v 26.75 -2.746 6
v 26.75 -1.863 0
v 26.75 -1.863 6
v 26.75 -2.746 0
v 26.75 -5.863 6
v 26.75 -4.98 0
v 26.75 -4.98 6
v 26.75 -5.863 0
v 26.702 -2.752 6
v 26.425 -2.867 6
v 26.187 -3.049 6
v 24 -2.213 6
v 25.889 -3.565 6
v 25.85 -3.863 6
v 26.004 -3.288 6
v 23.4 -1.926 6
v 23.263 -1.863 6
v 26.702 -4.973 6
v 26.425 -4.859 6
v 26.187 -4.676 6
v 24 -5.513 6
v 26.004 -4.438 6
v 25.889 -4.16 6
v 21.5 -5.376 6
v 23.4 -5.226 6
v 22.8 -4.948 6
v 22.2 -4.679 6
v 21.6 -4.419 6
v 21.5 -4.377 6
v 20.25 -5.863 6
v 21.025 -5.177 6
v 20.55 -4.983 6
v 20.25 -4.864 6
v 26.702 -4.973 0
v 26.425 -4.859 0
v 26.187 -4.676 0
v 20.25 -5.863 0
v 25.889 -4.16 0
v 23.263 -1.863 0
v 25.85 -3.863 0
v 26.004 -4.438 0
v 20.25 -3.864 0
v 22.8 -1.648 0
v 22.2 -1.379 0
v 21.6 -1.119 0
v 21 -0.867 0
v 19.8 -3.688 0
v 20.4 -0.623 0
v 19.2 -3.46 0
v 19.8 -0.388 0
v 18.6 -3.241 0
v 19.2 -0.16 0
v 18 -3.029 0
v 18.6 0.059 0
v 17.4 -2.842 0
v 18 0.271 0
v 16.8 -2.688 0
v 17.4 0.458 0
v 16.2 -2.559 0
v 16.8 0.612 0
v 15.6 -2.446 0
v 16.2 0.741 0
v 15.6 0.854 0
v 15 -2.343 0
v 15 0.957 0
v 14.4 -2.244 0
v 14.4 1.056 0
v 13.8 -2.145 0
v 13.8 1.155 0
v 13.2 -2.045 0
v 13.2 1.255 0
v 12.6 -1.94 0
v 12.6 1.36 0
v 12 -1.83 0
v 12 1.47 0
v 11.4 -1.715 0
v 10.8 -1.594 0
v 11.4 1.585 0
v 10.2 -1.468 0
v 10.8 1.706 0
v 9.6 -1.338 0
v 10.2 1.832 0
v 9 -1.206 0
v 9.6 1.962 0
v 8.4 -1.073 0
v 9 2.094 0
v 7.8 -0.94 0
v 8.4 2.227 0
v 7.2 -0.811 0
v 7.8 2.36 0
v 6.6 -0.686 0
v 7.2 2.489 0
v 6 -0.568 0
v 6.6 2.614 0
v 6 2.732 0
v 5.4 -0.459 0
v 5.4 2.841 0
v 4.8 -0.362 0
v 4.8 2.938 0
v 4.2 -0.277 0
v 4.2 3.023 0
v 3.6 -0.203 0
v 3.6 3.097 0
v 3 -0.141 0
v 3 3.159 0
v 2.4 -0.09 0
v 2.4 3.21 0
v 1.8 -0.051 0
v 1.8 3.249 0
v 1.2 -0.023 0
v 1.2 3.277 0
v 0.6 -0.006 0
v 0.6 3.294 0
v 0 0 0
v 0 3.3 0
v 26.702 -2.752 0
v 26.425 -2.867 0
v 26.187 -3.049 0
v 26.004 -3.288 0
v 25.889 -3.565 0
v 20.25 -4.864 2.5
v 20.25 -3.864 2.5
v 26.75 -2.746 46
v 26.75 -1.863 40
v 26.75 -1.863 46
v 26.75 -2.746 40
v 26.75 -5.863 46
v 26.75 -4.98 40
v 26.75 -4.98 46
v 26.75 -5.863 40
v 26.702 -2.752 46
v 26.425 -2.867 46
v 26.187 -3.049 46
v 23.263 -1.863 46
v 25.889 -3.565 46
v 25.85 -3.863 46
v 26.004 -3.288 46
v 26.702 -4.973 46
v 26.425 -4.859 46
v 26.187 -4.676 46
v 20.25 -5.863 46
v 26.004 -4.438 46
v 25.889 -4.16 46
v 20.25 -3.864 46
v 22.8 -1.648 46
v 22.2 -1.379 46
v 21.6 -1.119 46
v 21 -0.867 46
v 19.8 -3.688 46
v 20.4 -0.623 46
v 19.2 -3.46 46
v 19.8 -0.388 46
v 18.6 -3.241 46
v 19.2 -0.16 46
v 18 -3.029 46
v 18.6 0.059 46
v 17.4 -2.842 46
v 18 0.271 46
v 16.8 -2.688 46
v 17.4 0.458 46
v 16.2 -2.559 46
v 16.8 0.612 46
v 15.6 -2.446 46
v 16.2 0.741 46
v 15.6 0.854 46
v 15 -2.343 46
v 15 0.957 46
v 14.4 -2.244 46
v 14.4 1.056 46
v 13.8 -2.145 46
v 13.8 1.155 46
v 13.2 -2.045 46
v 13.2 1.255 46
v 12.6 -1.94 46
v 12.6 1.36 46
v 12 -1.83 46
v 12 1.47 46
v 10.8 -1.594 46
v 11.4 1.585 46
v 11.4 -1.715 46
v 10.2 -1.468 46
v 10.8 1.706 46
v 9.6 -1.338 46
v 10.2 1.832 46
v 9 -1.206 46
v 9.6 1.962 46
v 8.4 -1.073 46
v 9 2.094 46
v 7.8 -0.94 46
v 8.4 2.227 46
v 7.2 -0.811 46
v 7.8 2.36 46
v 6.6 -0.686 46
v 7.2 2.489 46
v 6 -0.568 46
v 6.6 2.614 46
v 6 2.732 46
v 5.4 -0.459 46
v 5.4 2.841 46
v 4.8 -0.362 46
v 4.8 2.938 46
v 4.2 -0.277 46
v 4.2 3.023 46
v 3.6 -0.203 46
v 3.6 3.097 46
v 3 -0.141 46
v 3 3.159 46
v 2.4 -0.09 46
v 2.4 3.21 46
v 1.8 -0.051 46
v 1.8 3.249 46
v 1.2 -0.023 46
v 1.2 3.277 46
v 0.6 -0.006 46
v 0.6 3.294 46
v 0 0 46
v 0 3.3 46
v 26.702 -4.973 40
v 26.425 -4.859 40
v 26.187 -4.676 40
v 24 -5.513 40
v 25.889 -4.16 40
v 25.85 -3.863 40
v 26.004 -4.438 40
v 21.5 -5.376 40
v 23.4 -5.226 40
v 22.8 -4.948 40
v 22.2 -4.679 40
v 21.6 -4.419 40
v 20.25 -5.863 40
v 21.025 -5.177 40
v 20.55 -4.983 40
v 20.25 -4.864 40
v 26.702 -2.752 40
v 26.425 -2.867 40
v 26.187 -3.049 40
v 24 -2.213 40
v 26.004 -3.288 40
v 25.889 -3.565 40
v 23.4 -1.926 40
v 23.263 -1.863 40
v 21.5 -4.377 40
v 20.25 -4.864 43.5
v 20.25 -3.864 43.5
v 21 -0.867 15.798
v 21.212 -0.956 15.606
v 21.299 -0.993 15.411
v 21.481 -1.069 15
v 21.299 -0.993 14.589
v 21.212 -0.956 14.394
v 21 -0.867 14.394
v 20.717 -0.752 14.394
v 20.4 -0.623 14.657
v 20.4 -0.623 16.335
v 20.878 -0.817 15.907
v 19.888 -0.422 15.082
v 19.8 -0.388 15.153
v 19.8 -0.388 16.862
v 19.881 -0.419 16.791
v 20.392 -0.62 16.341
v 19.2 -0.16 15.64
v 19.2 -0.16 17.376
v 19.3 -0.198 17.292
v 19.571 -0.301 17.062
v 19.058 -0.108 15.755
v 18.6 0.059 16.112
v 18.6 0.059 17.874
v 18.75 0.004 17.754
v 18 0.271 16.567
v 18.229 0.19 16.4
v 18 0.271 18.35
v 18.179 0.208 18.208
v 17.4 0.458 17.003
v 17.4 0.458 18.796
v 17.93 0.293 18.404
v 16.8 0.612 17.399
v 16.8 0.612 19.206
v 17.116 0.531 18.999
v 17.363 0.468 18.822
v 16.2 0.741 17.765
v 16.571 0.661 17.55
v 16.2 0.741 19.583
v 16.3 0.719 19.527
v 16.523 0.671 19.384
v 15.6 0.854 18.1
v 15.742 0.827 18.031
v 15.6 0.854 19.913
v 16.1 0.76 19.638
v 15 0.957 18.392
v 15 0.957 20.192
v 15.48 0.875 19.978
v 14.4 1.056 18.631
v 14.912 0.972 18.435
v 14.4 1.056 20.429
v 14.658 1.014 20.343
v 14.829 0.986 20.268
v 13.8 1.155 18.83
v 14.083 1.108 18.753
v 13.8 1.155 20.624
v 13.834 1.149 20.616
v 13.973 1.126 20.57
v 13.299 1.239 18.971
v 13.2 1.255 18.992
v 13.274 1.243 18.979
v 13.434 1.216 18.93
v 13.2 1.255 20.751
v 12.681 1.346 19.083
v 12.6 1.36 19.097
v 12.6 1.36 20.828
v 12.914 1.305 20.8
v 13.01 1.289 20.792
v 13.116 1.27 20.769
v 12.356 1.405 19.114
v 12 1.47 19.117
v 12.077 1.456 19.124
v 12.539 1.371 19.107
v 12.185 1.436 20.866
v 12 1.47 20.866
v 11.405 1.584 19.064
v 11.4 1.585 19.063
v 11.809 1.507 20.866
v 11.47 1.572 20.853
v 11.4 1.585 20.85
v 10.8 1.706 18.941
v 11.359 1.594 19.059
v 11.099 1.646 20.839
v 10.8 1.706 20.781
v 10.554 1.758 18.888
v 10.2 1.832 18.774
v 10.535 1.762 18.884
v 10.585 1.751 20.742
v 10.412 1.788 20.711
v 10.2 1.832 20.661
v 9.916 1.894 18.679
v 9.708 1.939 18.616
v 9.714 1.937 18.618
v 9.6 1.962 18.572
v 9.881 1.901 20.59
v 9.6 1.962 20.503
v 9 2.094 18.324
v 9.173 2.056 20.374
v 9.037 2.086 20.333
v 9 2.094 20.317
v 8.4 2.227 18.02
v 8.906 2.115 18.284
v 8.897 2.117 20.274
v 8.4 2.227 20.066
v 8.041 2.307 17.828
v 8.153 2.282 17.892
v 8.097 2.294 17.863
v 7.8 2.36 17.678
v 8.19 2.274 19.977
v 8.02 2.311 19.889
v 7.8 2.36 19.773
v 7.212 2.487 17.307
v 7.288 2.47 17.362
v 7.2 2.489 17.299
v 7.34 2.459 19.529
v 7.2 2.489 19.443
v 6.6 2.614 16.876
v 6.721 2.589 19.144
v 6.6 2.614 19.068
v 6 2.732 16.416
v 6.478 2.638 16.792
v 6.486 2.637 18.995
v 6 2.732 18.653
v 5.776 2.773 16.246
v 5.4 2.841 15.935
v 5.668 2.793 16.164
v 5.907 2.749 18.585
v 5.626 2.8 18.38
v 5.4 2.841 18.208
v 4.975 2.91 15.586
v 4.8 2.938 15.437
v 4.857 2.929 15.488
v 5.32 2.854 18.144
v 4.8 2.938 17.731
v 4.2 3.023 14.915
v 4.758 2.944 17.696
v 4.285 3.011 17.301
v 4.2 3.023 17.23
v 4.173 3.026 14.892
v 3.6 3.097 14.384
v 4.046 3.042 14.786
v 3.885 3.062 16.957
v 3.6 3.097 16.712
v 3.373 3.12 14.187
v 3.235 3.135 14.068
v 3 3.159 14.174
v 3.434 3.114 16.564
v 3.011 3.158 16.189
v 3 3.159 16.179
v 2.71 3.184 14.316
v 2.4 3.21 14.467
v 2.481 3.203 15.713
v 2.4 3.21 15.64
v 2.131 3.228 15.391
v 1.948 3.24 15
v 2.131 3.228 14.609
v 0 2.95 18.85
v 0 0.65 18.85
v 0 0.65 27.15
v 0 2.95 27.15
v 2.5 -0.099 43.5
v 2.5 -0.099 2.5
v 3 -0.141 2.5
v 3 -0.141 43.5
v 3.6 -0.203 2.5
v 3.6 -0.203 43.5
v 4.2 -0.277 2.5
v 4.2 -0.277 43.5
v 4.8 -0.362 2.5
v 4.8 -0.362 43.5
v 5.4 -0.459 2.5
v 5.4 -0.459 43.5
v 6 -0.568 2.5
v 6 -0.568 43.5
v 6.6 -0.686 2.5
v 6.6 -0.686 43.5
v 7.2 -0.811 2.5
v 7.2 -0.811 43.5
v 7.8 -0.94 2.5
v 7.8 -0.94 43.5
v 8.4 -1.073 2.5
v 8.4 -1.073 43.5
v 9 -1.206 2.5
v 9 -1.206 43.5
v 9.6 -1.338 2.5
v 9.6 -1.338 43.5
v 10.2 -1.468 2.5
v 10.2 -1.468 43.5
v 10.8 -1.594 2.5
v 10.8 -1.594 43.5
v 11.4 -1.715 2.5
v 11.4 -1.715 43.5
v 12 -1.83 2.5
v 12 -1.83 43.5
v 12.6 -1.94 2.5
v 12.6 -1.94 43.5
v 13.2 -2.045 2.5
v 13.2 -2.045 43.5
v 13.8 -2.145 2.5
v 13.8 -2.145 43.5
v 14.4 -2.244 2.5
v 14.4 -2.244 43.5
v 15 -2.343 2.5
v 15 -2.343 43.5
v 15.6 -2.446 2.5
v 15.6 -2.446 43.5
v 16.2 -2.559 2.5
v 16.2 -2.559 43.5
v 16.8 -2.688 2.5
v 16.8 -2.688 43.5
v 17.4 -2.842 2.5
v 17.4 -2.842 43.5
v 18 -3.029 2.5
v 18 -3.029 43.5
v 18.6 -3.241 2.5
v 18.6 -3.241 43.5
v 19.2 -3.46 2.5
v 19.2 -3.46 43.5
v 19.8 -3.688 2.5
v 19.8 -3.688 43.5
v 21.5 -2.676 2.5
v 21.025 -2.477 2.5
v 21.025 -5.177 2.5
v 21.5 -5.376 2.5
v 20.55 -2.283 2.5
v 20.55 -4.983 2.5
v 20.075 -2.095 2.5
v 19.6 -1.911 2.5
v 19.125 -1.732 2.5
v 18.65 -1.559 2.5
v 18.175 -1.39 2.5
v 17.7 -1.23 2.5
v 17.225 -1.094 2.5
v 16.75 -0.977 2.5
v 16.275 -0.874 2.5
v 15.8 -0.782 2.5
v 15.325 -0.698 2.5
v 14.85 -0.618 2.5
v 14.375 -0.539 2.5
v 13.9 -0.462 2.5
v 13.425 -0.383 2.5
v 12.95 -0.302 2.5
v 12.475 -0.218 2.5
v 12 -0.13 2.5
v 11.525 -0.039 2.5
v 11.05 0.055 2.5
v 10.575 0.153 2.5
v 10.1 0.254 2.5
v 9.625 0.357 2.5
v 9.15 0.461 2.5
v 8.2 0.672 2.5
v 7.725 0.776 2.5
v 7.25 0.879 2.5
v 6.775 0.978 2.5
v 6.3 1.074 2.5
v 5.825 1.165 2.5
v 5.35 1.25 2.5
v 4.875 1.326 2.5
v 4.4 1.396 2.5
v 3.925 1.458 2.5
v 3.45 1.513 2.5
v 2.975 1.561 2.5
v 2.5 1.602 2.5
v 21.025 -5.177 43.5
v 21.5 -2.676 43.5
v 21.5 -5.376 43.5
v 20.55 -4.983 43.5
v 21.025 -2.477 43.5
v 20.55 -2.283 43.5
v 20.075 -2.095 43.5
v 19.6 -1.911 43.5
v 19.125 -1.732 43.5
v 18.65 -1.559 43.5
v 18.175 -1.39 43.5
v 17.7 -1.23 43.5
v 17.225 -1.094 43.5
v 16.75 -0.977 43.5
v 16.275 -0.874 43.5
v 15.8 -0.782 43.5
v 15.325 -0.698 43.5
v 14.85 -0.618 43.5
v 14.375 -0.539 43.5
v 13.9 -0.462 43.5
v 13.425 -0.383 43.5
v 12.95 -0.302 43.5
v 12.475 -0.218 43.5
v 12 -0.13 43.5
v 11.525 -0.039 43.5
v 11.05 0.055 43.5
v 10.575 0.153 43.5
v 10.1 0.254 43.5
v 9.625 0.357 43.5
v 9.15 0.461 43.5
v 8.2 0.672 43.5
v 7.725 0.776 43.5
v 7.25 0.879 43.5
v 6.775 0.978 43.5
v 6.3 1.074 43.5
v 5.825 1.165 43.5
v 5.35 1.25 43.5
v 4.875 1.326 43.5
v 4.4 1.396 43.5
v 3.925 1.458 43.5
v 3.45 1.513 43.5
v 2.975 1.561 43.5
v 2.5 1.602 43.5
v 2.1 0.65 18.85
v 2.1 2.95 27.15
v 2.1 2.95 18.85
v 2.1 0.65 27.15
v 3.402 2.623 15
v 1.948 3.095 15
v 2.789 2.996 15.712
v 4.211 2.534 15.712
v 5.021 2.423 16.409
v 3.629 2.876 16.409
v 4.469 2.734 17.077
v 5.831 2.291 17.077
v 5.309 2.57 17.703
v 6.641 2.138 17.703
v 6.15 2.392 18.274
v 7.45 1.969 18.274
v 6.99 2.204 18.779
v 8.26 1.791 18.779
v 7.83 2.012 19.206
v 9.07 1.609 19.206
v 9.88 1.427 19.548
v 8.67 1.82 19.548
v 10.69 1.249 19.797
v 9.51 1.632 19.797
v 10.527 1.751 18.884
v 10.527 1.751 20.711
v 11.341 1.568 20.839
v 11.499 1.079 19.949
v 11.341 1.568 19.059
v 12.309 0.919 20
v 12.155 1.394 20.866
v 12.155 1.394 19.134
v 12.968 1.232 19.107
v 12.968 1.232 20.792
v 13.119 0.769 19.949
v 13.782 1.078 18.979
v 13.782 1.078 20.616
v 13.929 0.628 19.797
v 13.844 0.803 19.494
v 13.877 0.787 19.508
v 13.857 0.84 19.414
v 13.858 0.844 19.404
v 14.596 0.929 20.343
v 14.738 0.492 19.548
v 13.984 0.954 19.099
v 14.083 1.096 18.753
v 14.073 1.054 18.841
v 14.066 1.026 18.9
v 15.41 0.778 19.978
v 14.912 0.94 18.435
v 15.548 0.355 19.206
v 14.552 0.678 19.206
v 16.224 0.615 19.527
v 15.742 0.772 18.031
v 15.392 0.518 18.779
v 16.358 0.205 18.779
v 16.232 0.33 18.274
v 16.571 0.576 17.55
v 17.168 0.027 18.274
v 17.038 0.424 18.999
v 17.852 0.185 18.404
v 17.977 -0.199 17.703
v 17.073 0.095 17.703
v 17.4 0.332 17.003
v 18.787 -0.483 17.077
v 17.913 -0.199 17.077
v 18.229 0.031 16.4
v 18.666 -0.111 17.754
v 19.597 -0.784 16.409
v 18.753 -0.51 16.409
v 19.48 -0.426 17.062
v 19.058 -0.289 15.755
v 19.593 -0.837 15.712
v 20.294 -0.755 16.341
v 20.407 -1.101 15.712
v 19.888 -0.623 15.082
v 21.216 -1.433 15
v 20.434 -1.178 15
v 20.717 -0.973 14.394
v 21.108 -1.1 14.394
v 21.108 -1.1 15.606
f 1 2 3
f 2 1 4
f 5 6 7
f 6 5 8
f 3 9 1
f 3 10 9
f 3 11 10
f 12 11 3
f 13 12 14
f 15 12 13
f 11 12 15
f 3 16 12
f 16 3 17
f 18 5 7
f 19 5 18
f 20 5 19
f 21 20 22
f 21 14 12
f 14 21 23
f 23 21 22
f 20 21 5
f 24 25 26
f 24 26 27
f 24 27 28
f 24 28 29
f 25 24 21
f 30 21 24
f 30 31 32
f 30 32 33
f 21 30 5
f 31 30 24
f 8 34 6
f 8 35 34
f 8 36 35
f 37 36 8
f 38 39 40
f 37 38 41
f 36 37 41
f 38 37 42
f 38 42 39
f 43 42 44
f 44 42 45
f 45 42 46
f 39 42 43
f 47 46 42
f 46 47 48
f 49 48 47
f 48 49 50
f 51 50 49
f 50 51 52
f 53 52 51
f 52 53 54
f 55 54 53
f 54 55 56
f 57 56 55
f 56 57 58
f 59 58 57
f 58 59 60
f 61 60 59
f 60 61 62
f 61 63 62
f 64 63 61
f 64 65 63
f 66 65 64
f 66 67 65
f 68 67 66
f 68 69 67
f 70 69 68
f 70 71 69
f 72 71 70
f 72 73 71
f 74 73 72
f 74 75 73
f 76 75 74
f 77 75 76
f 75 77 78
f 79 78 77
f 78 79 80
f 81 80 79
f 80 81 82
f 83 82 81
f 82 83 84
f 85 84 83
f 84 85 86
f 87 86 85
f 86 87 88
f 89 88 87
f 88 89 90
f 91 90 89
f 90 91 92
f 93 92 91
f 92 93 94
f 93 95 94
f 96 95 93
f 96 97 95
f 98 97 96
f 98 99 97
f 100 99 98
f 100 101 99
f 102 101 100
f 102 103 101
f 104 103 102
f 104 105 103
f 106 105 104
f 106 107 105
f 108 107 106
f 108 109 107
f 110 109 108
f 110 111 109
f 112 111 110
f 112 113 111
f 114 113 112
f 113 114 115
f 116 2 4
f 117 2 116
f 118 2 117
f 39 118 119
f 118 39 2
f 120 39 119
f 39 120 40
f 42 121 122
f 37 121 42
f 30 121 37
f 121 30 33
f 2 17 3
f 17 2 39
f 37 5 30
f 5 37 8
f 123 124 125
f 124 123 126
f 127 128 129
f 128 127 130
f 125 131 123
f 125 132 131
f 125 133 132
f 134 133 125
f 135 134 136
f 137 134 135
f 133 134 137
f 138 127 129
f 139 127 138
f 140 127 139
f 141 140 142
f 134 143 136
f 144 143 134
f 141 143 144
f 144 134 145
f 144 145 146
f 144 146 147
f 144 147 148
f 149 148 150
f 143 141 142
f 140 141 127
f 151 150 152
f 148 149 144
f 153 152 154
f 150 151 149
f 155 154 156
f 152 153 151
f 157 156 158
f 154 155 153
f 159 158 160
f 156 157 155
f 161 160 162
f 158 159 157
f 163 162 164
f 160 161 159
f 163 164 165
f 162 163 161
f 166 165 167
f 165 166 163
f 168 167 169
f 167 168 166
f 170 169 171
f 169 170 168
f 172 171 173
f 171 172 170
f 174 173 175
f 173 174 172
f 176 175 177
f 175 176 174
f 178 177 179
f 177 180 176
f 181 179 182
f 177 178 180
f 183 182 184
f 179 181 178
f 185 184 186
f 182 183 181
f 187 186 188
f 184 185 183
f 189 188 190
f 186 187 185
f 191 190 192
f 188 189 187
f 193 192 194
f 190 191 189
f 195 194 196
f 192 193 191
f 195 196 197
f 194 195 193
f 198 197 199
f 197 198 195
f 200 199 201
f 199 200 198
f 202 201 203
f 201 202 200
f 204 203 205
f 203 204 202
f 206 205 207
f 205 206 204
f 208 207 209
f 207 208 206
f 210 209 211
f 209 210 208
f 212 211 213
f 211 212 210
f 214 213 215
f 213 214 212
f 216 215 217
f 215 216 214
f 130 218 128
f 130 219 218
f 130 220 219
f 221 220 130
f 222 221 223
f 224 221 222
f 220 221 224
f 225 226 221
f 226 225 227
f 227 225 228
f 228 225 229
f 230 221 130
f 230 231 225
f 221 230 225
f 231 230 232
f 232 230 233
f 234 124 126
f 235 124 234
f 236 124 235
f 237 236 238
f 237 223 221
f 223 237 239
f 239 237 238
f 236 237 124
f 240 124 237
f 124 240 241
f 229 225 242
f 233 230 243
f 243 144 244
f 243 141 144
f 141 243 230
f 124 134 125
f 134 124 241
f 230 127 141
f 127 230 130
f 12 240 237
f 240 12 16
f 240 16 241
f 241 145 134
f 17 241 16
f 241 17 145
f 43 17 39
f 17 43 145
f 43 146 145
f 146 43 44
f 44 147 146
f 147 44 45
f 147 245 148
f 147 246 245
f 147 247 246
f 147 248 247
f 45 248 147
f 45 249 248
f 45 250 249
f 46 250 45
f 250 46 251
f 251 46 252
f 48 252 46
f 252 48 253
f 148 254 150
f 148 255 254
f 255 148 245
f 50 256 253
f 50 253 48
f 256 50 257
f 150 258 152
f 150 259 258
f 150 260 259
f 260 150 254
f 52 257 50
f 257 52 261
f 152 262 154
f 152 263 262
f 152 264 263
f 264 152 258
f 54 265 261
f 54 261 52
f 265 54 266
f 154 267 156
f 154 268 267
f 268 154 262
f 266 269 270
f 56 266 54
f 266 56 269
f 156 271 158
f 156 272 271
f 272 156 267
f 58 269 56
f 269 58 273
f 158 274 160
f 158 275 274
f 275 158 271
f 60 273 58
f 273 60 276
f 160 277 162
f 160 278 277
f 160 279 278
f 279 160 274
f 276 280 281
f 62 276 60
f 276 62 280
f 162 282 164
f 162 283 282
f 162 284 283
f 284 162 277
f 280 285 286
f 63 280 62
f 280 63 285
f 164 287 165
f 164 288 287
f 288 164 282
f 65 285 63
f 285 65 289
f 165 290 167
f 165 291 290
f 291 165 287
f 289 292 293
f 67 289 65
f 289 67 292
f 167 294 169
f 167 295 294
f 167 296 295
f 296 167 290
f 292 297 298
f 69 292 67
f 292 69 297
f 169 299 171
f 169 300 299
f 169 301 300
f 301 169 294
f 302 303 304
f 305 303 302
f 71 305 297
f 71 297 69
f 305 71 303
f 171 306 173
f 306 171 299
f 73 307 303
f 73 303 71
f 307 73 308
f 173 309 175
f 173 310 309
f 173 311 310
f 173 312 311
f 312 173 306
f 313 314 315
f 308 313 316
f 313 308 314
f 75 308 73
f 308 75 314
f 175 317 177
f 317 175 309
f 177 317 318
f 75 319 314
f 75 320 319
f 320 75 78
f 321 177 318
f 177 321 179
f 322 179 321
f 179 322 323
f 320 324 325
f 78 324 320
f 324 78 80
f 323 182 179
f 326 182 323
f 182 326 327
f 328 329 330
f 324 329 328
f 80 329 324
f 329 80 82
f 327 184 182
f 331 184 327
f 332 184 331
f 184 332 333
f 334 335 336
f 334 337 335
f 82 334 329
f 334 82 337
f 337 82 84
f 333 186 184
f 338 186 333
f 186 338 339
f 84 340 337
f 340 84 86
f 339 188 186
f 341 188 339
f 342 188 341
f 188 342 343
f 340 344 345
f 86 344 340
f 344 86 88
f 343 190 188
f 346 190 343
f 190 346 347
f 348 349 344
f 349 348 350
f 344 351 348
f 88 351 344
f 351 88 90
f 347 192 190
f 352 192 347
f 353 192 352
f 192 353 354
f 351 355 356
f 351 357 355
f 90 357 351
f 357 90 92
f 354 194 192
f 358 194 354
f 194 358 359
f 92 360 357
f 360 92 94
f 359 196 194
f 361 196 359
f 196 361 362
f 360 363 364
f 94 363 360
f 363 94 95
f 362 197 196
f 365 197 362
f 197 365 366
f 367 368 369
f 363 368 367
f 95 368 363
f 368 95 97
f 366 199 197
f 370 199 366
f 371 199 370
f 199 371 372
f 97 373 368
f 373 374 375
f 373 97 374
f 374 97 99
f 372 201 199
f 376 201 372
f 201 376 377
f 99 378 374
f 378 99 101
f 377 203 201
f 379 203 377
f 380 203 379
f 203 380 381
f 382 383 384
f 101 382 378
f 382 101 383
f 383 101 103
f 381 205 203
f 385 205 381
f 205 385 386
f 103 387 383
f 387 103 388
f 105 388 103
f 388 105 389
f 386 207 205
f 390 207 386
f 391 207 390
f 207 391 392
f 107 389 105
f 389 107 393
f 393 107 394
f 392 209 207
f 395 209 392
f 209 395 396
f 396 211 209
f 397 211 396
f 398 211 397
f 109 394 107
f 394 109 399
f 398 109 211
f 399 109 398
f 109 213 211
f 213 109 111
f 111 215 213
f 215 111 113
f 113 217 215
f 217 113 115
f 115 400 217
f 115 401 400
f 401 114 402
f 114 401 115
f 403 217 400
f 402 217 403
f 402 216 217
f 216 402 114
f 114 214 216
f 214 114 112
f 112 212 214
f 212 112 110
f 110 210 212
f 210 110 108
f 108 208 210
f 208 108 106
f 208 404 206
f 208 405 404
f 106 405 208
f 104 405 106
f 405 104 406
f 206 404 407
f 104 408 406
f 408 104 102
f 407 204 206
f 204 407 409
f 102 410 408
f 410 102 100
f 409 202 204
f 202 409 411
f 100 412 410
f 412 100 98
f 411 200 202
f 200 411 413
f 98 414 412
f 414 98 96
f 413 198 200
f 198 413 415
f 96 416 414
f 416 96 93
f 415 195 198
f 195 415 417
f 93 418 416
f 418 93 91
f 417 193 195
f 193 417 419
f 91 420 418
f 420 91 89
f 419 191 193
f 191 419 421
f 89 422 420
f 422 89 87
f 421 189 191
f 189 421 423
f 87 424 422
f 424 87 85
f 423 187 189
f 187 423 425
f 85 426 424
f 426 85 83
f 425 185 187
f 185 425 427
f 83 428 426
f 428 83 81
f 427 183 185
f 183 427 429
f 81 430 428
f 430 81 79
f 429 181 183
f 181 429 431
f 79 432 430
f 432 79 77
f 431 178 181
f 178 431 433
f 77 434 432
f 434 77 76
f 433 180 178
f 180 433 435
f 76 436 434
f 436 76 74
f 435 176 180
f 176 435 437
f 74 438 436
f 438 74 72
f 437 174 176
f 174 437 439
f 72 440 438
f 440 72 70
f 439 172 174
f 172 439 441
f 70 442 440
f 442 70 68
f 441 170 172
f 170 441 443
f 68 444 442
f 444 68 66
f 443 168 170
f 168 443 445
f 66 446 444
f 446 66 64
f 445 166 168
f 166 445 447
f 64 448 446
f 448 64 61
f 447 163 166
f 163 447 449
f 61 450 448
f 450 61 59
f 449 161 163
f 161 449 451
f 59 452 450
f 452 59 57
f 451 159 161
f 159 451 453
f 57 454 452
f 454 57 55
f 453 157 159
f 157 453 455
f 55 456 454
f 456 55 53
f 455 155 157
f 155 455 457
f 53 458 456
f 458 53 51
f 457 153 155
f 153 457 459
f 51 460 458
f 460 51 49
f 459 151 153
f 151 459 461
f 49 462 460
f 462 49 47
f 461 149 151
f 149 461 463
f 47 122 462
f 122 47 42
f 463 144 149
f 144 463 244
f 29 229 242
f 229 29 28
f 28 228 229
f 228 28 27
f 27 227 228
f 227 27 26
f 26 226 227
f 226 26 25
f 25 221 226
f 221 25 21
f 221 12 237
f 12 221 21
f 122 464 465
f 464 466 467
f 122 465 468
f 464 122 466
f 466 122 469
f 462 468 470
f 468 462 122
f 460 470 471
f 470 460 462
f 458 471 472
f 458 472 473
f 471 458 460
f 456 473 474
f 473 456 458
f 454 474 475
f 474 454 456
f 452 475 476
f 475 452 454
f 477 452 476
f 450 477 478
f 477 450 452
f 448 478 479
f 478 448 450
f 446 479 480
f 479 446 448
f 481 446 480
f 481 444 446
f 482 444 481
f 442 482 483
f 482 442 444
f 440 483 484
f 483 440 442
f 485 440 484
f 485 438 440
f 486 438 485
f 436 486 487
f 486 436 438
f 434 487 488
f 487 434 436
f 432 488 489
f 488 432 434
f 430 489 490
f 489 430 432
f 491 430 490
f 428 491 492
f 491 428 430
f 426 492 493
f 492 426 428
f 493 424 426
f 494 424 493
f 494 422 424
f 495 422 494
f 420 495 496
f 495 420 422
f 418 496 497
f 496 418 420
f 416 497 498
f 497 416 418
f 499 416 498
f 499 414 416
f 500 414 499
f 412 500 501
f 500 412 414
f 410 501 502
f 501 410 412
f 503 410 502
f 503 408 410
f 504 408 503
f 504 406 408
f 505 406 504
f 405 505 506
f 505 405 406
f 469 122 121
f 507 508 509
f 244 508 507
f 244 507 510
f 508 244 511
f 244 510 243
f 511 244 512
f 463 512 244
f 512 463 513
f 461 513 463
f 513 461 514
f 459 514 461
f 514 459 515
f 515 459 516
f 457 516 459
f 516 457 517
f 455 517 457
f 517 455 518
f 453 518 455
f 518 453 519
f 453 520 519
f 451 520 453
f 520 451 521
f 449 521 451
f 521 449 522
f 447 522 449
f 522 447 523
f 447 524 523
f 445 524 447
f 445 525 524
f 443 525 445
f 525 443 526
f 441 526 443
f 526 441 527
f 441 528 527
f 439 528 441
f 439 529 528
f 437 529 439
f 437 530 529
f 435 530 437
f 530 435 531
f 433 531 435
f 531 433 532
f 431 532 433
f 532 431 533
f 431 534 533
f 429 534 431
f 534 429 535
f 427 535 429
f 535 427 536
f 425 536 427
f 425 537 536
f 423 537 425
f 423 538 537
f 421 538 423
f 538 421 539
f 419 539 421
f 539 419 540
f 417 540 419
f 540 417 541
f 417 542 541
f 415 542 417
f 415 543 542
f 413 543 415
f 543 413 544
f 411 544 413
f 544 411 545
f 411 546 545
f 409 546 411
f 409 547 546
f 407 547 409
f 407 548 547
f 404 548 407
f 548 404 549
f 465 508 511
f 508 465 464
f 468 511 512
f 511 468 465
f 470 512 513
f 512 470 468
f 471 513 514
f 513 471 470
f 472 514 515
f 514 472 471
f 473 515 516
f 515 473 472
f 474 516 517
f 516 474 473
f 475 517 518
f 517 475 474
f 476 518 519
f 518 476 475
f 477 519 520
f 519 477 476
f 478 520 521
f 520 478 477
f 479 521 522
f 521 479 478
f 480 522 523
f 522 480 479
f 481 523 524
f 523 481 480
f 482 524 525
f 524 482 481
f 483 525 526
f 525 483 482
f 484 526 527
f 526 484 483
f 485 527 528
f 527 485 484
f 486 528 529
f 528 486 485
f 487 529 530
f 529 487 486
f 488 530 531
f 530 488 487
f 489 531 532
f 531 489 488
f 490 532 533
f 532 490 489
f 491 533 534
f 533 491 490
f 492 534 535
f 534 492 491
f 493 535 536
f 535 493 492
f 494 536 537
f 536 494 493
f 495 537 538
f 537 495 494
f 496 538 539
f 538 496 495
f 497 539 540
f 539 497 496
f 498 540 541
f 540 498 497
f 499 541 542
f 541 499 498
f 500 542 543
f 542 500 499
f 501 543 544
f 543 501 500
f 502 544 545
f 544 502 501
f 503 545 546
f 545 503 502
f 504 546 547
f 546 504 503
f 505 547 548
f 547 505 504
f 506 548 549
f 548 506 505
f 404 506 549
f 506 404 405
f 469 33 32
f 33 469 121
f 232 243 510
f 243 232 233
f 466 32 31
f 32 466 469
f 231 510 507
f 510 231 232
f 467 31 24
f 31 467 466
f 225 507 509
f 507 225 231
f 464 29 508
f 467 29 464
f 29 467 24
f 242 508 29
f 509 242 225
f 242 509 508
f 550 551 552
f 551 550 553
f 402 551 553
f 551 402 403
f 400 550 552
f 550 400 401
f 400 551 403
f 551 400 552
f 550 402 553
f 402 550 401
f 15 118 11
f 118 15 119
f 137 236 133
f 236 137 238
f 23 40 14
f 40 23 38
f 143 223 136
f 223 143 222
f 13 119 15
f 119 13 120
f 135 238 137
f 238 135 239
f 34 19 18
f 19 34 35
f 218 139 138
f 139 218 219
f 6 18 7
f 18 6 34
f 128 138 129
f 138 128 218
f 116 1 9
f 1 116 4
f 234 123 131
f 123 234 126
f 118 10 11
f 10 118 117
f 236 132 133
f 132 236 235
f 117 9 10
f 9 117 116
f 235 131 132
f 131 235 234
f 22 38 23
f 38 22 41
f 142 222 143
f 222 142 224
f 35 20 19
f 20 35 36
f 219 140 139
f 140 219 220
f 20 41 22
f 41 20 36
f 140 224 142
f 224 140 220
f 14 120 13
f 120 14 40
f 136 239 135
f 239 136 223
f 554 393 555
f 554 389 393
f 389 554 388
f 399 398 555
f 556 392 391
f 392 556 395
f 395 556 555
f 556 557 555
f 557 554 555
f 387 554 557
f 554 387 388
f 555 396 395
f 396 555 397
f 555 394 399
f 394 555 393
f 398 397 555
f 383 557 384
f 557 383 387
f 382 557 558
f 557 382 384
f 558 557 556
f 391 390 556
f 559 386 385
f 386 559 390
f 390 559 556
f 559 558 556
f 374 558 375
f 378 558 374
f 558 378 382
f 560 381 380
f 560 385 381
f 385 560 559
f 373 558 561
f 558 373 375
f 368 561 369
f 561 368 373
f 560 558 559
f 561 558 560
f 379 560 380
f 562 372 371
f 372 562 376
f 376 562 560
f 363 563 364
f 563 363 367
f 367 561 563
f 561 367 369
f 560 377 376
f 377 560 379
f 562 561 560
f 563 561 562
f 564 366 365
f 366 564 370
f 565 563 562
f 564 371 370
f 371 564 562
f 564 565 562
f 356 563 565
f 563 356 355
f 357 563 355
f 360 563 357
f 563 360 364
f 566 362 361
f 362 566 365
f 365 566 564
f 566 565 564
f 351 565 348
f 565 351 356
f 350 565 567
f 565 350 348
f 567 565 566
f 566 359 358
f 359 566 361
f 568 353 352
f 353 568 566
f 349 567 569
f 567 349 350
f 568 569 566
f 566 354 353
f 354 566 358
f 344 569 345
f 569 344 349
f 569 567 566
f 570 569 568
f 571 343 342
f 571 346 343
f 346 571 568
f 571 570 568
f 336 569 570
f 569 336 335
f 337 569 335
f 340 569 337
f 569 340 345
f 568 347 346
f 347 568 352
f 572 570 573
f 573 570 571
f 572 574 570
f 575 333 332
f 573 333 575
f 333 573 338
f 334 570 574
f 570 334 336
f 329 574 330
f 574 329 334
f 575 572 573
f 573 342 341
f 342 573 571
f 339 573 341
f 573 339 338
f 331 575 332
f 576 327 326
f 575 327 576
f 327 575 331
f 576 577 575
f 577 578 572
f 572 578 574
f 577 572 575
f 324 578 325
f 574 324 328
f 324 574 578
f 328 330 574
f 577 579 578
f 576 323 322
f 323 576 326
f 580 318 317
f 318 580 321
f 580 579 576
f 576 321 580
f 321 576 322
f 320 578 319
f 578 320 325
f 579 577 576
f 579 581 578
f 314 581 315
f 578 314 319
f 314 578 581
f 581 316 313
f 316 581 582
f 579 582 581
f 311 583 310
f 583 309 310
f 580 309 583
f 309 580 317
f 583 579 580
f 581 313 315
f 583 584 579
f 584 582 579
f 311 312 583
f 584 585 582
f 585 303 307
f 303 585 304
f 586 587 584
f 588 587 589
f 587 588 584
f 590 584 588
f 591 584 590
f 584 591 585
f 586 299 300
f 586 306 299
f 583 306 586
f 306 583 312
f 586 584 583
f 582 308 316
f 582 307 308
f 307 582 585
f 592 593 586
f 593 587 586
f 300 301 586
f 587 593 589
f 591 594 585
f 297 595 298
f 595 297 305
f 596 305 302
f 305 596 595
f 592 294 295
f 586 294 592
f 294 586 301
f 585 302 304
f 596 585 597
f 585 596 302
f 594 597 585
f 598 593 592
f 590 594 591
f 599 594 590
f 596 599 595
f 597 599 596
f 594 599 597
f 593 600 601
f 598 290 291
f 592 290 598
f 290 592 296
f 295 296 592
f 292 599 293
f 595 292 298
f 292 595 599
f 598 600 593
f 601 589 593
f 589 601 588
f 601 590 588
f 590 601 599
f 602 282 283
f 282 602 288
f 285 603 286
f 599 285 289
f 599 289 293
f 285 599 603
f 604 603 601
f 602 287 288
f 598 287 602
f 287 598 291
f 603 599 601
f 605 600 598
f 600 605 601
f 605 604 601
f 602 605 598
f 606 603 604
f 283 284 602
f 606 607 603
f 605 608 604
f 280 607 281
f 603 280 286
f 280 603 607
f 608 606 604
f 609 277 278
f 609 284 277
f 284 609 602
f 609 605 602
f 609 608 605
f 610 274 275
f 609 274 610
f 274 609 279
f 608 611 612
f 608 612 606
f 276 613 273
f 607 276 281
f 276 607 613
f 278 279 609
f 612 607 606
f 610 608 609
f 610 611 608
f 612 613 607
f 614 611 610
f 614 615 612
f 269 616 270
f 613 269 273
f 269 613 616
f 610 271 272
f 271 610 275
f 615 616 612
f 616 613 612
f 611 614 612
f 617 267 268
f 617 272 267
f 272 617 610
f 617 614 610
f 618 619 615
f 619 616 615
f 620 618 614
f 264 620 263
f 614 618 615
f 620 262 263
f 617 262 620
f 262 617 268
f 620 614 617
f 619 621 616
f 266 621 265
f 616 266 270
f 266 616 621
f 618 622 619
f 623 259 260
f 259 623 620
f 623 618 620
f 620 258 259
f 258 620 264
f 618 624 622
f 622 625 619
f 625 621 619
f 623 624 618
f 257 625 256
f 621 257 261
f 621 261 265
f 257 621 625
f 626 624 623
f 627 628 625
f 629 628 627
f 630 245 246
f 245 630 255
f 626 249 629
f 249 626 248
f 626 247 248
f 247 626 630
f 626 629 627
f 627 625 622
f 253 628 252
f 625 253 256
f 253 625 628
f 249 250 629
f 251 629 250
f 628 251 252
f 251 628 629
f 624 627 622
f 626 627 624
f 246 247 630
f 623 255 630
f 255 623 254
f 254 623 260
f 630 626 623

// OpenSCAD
use <wrist_mount_piece.scad>

// ============================================================
// Decorated variant v2 -- continuous engraved line via hull()
// between consecutive spheres (reads as a swept groove instead
// of a strand of beads). Leaf accents dropped for now -- at this
// scale they read as blobs rather than leaves; simple line work
// first, ornament later (maybe toward the reticulated porcelain
// positive/negative space idea once we've got room to do it
// properly -- that's a real project on its own, not a bolt-on).
//
// Safety note: hull() of two spheres is always convex. Many
// convex solids subtracted from one shell (difference(shell,
// seg1, seg2, ...)) is ordinary CSG -- not the multi-concave-
// union pattern that broke CGAL on the cameo.
// ============================================================

mount_run_d      = 24;
r_inner_d        = 32;
r_outer_d        = 55;
blend_start_d    = 6;
blend_end_d      = 18;
back_thickness_d = 1.6;
foam_thickness_d = 2.0;
foam_proud_d     = 0.3;
pocket_depth_d   = foam_thickness_d - foam_proud_d;
mount_length_d   = 30;

function sag_d(x, r) = r - sqrt(max(r*r - x*x, 0));
function smoothstep_d(x, a, b) =
    let(t = min(max((x - a) / (b - a), 0), 1))
    t * t * (3 - 2 * t);
function sag_blend_d(x) =
    let(w = smoothstep_d(x, blend_start_d, blend_end_d))
    sag_d(x, r_inner_d) * (1 - w) + sag_d(x, r_outer_d) * w;
function z_bottom_d(x) = -sag_blend_d(x);
function z_floor_d(x)  = z_bottom_d(x) + pocket_depth_d;
function back_z(x)     = z_floor_d(x) + back_thickness_d;
function lerp(a, b, t) = a + (b - a) * t;

// ---------- VINE PATH -----------------------------------------
vine_steps    = 22;
vine_x0       = 3;
vine_x1       = mount_run_d - 3;
vine_z_mid    = mount_length_d / 2;
vine_amp      = 5;
vine_freq     = 1.0;
vine_r_start  = 1.3;
vine_r_end    = 0.7;     // tapers thinner toward the strap edge
engrave_depth = 0.6;

function vine_x(t) = vine_x0 + (vine_x1 - vine_x0) * t;
function vine_z(t) = vine_z_mid + vine_amp * sin(t * 360 * vine_freq / 2);
function vine_r(t) = lerp(vine_r_start, vine_r_end, t);

module vine_point(t) {
    x = vine_x(t);
    z = vine_z(t);
    r = vine_r(t);
    y = back_z(x) + (r - engrave_depth);
    translate([x, y, z]) sphere(r = r);
}

module vine_cutter() {
    for (i = [0 : vine_steps - 1]) {
        hull() {
            vine_point(i / vine_steps);
            vine_point((i + 1) / vine_steps);
        }
    }
}

module decorated_mount_piece_v3() {
    difference() {
        mount_piece();
        vine_cutter();
    }
}

decorated_mount_piece_v3();
